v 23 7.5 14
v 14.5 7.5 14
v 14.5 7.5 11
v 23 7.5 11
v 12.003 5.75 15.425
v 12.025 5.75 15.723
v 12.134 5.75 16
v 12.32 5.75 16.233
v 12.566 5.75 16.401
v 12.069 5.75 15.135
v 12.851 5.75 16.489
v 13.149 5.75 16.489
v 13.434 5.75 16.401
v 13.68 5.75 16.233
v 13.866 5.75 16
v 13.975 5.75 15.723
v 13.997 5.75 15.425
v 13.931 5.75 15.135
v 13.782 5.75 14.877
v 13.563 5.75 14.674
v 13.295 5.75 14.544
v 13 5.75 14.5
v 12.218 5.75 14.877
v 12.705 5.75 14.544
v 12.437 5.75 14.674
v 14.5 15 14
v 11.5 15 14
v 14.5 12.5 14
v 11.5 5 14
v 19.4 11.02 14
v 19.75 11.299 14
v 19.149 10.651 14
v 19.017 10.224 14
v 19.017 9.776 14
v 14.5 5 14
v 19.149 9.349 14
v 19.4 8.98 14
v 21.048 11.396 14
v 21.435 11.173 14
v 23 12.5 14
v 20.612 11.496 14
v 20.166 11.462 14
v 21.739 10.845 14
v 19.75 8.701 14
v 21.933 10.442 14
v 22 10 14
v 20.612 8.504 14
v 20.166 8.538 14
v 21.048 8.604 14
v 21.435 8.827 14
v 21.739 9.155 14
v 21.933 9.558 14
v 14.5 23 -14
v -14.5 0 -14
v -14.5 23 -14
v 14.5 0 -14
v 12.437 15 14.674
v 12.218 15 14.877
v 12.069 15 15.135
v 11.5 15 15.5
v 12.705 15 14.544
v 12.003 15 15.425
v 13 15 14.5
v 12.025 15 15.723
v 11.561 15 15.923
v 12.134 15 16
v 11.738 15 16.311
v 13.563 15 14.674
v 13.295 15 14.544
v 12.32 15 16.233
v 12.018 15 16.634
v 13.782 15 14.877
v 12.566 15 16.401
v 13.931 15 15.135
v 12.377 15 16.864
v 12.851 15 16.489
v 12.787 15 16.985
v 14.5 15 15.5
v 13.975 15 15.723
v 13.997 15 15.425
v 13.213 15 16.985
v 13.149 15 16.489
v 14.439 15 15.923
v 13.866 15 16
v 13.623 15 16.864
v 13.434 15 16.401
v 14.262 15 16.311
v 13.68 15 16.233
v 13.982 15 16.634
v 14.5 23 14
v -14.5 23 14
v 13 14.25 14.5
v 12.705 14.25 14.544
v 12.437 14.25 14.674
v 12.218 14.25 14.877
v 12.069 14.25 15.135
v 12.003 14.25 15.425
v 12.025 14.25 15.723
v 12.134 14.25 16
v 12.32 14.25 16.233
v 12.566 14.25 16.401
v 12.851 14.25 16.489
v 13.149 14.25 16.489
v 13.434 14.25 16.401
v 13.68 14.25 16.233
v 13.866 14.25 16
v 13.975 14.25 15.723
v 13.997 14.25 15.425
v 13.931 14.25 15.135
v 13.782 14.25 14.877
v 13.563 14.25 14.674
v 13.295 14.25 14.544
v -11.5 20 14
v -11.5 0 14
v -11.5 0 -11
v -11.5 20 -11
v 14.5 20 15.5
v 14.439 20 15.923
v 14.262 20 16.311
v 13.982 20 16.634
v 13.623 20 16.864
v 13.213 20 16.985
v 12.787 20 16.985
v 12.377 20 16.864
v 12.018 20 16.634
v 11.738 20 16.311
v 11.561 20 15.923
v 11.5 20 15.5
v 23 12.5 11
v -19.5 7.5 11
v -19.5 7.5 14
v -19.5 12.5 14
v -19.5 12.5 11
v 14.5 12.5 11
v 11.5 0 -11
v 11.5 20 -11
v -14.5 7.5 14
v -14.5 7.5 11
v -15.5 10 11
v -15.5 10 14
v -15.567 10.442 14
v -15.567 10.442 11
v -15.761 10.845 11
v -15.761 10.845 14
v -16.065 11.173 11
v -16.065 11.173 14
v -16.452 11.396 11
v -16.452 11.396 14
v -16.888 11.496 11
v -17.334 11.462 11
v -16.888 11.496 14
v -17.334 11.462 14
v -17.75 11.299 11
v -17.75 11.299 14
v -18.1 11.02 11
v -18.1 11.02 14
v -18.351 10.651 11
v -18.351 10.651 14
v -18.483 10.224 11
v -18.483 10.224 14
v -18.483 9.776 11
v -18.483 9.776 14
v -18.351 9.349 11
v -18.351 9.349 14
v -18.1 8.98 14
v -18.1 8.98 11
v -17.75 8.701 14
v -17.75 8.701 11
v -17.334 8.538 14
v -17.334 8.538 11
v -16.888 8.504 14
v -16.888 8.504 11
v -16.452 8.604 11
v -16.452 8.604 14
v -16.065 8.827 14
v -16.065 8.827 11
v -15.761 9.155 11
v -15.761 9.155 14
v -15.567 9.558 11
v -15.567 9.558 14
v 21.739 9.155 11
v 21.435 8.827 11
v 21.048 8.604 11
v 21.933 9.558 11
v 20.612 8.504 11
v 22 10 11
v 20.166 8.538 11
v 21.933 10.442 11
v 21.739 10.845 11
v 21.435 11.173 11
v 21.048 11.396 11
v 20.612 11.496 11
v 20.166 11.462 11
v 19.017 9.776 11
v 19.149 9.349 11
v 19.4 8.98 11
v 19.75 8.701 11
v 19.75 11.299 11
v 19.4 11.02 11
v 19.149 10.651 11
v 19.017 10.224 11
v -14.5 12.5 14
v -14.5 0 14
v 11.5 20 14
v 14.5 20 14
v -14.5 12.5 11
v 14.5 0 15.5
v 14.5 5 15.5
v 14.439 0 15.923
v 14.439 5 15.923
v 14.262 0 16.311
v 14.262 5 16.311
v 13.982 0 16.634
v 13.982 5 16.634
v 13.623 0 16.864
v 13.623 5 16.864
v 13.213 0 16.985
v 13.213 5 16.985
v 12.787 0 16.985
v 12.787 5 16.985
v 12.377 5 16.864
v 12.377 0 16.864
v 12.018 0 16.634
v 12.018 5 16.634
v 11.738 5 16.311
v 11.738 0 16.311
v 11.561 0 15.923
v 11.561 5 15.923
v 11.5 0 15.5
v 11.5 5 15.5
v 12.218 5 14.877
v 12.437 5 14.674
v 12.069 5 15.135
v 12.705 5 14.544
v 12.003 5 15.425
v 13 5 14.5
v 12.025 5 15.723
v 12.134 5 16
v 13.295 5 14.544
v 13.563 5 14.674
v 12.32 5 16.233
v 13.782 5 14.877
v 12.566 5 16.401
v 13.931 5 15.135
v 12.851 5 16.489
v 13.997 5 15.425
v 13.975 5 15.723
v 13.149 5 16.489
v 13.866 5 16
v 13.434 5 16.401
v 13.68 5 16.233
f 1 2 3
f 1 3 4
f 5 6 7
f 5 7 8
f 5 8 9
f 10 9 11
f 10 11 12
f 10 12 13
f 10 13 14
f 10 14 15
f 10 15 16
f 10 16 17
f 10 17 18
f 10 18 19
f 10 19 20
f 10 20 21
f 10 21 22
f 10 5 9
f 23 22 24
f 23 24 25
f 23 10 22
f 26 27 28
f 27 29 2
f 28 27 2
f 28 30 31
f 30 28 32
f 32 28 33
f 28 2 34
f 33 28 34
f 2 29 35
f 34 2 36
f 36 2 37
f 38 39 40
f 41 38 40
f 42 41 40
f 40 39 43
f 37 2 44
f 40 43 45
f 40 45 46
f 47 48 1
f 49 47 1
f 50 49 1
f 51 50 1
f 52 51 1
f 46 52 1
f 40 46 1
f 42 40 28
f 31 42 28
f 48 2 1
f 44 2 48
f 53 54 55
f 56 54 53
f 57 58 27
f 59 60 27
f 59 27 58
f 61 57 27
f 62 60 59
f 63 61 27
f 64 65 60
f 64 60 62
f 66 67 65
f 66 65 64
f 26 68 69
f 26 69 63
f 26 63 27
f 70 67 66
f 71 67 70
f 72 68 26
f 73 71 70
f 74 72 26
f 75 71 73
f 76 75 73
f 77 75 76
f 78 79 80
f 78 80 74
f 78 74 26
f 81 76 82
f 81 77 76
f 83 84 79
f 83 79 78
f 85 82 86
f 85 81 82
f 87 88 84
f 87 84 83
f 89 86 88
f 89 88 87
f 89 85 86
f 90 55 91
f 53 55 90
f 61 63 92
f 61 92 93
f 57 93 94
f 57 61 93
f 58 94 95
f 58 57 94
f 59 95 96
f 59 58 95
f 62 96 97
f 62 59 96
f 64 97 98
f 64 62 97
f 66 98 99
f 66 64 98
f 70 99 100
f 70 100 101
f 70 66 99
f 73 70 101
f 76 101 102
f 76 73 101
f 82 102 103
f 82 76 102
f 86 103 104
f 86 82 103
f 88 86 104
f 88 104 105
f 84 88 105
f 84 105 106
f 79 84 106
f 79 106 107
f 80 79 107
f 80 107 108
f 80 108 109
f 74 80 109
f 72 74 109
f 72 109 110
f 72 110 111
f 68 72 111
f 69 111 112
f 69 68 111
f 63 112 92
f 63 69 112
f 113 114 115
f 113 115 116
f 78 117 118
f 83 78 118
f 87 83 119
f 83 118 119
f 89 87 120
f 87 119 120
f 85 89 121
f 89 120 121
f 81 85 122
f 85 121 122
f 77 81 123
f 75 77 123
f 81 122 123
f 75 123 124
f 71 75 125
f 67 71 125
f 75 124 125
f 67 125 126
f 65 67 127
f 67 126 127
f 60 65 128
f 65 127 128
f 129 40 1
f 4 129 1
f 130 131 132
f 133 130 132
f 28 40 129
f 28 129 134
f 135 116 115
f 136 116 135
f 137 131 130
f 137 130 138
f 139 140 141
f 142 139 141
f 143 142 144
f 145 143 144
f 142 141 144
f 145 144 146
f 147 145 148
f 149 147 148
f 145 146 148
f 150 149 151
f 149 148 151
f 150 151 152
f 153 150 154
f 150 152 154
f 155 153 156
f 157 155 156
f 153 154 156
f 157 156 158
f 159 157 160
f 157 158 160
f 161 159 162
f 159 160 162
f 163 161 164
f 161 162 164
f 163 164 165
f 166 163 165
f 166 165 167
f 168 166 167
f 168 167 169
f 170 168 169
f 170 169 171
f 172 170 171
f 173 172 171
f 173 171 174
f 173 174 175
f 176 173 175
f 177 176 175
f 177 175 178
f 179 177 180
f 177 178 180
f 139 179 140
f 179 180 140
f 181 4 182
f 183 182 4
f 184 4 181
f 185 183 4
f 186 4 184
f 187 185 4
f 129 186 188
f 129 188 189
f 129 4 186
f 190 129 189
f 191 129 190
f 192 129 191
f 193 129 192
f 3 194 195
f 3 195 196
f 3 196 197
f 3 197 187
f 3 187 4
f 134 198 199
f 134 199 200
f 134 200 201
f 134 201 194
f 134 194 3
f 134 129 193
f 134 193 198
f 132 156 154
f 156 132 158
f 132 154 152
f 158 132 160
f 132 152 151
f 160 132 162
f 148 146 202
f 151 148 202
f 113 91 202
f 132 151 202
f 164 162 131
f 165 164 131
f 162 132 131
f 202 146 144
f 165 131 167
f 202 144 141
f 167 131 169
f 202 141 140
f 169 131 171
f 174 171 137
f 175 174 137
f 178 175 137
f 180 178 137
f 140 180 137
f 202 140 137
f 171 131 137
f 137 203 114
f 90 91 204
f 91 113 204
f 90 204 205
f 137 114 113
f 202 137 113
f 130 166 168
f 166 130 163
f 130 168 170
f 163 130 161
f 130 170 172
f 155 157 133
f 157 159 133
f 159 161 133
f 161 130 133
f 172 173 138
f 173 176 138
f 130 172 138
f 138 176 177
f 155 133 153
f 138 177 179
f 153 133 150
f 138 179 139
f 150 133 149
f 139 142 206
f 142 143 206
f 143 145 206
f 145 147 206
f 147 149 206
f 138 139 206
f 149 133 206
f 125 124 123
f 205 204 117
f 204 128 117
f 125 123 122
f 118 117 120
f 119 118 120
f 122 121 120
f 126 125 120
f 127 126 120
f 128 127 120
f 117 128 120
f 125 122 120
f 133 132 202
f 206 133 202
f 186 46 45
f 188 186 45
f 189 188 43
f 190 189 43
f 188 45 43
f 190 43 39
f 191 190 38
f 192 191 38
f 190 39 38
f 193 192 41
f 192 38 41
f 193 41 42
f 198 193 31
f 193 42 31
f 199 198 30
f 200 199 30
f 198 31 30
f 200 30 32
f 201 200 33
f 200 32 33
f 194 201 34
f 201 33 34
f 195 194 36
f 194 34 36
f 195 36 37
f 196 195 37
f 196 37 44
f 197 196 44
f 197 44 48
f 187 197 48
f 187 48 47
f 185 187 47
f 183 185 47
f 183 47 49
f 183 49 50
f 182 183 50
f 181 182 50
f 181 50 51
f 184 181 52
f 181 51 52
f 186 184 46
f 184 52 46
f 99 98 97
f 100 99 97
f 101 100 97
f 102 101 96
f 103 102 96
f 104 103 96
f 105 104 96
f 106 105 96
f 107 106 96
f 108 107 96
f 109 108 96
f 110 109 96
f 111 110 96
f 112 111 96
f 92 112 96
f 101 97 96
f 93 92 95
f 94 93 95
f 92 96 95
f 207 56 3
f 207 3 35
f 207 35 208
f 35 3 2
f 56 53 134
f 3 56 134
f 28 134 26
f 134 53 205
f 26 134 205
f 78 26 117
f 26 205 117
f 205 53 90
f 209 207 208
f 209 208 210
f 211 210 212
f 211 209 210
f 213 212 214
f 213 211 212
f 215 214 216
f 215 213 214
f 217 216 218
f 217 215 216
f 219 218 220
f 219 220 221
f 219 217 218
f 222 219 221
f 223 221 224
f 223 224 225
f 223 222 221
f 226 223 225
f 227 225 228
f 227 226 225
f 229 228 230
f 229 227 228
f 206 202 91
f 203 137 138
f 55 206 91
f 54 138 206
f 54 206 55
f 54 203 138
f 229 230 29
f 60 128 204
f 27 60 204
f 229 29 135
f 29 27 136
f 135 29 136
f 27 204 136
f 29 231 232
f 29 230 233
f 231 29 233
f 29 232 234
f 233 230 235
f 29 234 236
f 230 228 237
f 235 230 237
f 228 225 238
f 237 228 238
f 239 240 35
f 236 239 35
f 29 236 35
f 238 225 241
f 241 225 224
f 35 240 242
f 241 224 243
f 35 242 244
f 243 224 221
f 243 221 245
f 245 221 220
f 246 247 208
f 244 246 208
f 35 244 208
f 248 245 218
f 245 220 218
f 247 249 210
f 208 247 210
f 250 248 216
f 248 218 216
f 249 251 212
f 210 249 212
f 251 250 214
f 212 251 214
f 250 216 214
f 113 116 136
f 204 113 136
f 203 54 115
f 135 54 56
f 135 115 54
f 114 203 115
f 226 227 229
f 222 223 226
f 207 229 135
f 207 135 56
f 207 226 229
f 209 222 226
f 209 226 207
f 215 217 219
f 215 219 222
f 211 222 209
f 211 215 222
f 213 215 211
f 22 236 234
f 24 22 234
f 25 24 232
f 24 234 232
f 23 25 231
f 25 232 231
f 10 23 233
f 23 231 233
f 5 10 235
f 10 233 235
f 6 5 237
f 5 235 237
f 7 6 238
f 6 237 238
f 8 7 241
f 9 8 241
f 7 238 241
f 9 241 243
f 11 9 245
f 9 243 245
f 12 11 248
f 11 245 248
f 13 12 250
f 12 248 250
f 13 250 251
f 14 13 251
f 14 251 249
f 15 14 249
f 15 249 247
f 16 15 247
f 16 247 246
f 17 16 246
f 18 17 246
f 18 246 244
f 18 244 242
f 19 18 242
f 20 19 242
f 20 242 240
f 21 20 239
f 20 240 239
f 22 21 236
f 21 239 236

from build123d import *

# Parameters (mm, degrees)
CROQUIS1_W              = 29
CROQUIS1_H              = 28
SALIENTE_EXTRUIR1_DEPTH = 23
CROQUIS2_W              = 23
CROQUIS2_H              = 20
CORTAR_EXTRUIR1_DEPTH   = 25
SALIENTE_EXTRUIR5_DEPTH = 5
CROQUIS12_R             = 1
SALIENTE_EXTRUIR7_DEPTH = 0.75
CROQUIS13_R             = 1.5
CROQUIS13_W             = 5
CROQUIS13_H             = 5
SALIENTE_EXTRUIR8_DEPTH = 3


with BuildPart() as part:
    # Croquis1 → Saliente-Extruir1 (new body)
    with BuildSketch(Plane(origin=(0, 0, 0), x_dir=(1, 0, 0), z_dir=(0, 1, 0))):
        Rectangle(CROQUIS1_W, CROQUIS1_H)
    extrude(amount=SALIENTE_EXTRUIR1_DEPTH)

    # Croquis2 → Cortar-Extruir1 (cut)
    with BuildSketch(Plane.XY.offset(14)):
        with Locations((0, 10)):
            Rectangle(CROQUIS2_W, CROQUIS2_H)
    extrude(amount=-CORTAR_EXTRUIR1_DEPTH, mode=Mode.SUBTRACT)

    # Croquis10 → Saliente-Extruir5 (add)
    with BuildSketch(Plane.XZ):
        with BuildLine():
            Line((11.5, 14), (14.5, 14))
            Line((14.5, 14), (14.5, 15.5))
            ThreePointArc((14.5, 15.5), (13, 17), (11.5, 15.5))
            Line((11.5, 15.5), (11.5, 14))
        make_face()
    saliente_extruir5 = extrude(amount=-SALIENTE_EXTRUIR5_DEPTH)

    # Croquis12 → Saliente-Extruir7 (add)
    with BuildSketch(Plane(origin=(0, 5, 0), x_dir=(1, 0, 0), z_dir=(0, 1, 0))):
        with Locations(Location((13, -15.5, 0), (0, 0, 90))):
            Circle(CROQUIS12_R)
    saliente_extruir7 = extrude(amount=SALIENTE_EXTRUIR7_DEPTH)

    # Simetría1: Saliente-Extruir5, Saliente-Extruir7 across plane
    add(saliente_extruir5.mirror(Plane(origin=(0, 10, 0), x_dir=(0, 0, 1), z_dir=(0, -1, 0))))
    add(saliente_extruir7.mirror(Plane(origin=(0, 10, 0), x_dir=(0, 0, 1), z_dir=(0, -1, 0))))

    # Croquis13 → Saliente-Extruir8 (add)
    # profile 1 of 2: a face of its own
    with BuildSketch(Plane.XY.offset(14)):
        Polygon((18, 12.5), (23, 12.5), (23, 7.5), (18, 7.5), (14.5, 7.5), (14.5, 12.5), align=None)
        with Locations((20.5, 10)):
            Circle(CROQUIS13_R, mode=Mode.SUBTRACT)
    # profile 2 of 2: a face of its own
    with BuildSketch(Plane.XY.offset(14)):
        with Locations((-17, 10)):
            Rectangle(CROQUIS13_W, CROQUIS13_H)
        with Locations((-17, 10)):
            Circle(CROQUIS13_R, mode=Mode.SUBTRACT)
    extrude(amount=-SALIENTE_EXTRUIR8_DEPTH)


solid = part.part
